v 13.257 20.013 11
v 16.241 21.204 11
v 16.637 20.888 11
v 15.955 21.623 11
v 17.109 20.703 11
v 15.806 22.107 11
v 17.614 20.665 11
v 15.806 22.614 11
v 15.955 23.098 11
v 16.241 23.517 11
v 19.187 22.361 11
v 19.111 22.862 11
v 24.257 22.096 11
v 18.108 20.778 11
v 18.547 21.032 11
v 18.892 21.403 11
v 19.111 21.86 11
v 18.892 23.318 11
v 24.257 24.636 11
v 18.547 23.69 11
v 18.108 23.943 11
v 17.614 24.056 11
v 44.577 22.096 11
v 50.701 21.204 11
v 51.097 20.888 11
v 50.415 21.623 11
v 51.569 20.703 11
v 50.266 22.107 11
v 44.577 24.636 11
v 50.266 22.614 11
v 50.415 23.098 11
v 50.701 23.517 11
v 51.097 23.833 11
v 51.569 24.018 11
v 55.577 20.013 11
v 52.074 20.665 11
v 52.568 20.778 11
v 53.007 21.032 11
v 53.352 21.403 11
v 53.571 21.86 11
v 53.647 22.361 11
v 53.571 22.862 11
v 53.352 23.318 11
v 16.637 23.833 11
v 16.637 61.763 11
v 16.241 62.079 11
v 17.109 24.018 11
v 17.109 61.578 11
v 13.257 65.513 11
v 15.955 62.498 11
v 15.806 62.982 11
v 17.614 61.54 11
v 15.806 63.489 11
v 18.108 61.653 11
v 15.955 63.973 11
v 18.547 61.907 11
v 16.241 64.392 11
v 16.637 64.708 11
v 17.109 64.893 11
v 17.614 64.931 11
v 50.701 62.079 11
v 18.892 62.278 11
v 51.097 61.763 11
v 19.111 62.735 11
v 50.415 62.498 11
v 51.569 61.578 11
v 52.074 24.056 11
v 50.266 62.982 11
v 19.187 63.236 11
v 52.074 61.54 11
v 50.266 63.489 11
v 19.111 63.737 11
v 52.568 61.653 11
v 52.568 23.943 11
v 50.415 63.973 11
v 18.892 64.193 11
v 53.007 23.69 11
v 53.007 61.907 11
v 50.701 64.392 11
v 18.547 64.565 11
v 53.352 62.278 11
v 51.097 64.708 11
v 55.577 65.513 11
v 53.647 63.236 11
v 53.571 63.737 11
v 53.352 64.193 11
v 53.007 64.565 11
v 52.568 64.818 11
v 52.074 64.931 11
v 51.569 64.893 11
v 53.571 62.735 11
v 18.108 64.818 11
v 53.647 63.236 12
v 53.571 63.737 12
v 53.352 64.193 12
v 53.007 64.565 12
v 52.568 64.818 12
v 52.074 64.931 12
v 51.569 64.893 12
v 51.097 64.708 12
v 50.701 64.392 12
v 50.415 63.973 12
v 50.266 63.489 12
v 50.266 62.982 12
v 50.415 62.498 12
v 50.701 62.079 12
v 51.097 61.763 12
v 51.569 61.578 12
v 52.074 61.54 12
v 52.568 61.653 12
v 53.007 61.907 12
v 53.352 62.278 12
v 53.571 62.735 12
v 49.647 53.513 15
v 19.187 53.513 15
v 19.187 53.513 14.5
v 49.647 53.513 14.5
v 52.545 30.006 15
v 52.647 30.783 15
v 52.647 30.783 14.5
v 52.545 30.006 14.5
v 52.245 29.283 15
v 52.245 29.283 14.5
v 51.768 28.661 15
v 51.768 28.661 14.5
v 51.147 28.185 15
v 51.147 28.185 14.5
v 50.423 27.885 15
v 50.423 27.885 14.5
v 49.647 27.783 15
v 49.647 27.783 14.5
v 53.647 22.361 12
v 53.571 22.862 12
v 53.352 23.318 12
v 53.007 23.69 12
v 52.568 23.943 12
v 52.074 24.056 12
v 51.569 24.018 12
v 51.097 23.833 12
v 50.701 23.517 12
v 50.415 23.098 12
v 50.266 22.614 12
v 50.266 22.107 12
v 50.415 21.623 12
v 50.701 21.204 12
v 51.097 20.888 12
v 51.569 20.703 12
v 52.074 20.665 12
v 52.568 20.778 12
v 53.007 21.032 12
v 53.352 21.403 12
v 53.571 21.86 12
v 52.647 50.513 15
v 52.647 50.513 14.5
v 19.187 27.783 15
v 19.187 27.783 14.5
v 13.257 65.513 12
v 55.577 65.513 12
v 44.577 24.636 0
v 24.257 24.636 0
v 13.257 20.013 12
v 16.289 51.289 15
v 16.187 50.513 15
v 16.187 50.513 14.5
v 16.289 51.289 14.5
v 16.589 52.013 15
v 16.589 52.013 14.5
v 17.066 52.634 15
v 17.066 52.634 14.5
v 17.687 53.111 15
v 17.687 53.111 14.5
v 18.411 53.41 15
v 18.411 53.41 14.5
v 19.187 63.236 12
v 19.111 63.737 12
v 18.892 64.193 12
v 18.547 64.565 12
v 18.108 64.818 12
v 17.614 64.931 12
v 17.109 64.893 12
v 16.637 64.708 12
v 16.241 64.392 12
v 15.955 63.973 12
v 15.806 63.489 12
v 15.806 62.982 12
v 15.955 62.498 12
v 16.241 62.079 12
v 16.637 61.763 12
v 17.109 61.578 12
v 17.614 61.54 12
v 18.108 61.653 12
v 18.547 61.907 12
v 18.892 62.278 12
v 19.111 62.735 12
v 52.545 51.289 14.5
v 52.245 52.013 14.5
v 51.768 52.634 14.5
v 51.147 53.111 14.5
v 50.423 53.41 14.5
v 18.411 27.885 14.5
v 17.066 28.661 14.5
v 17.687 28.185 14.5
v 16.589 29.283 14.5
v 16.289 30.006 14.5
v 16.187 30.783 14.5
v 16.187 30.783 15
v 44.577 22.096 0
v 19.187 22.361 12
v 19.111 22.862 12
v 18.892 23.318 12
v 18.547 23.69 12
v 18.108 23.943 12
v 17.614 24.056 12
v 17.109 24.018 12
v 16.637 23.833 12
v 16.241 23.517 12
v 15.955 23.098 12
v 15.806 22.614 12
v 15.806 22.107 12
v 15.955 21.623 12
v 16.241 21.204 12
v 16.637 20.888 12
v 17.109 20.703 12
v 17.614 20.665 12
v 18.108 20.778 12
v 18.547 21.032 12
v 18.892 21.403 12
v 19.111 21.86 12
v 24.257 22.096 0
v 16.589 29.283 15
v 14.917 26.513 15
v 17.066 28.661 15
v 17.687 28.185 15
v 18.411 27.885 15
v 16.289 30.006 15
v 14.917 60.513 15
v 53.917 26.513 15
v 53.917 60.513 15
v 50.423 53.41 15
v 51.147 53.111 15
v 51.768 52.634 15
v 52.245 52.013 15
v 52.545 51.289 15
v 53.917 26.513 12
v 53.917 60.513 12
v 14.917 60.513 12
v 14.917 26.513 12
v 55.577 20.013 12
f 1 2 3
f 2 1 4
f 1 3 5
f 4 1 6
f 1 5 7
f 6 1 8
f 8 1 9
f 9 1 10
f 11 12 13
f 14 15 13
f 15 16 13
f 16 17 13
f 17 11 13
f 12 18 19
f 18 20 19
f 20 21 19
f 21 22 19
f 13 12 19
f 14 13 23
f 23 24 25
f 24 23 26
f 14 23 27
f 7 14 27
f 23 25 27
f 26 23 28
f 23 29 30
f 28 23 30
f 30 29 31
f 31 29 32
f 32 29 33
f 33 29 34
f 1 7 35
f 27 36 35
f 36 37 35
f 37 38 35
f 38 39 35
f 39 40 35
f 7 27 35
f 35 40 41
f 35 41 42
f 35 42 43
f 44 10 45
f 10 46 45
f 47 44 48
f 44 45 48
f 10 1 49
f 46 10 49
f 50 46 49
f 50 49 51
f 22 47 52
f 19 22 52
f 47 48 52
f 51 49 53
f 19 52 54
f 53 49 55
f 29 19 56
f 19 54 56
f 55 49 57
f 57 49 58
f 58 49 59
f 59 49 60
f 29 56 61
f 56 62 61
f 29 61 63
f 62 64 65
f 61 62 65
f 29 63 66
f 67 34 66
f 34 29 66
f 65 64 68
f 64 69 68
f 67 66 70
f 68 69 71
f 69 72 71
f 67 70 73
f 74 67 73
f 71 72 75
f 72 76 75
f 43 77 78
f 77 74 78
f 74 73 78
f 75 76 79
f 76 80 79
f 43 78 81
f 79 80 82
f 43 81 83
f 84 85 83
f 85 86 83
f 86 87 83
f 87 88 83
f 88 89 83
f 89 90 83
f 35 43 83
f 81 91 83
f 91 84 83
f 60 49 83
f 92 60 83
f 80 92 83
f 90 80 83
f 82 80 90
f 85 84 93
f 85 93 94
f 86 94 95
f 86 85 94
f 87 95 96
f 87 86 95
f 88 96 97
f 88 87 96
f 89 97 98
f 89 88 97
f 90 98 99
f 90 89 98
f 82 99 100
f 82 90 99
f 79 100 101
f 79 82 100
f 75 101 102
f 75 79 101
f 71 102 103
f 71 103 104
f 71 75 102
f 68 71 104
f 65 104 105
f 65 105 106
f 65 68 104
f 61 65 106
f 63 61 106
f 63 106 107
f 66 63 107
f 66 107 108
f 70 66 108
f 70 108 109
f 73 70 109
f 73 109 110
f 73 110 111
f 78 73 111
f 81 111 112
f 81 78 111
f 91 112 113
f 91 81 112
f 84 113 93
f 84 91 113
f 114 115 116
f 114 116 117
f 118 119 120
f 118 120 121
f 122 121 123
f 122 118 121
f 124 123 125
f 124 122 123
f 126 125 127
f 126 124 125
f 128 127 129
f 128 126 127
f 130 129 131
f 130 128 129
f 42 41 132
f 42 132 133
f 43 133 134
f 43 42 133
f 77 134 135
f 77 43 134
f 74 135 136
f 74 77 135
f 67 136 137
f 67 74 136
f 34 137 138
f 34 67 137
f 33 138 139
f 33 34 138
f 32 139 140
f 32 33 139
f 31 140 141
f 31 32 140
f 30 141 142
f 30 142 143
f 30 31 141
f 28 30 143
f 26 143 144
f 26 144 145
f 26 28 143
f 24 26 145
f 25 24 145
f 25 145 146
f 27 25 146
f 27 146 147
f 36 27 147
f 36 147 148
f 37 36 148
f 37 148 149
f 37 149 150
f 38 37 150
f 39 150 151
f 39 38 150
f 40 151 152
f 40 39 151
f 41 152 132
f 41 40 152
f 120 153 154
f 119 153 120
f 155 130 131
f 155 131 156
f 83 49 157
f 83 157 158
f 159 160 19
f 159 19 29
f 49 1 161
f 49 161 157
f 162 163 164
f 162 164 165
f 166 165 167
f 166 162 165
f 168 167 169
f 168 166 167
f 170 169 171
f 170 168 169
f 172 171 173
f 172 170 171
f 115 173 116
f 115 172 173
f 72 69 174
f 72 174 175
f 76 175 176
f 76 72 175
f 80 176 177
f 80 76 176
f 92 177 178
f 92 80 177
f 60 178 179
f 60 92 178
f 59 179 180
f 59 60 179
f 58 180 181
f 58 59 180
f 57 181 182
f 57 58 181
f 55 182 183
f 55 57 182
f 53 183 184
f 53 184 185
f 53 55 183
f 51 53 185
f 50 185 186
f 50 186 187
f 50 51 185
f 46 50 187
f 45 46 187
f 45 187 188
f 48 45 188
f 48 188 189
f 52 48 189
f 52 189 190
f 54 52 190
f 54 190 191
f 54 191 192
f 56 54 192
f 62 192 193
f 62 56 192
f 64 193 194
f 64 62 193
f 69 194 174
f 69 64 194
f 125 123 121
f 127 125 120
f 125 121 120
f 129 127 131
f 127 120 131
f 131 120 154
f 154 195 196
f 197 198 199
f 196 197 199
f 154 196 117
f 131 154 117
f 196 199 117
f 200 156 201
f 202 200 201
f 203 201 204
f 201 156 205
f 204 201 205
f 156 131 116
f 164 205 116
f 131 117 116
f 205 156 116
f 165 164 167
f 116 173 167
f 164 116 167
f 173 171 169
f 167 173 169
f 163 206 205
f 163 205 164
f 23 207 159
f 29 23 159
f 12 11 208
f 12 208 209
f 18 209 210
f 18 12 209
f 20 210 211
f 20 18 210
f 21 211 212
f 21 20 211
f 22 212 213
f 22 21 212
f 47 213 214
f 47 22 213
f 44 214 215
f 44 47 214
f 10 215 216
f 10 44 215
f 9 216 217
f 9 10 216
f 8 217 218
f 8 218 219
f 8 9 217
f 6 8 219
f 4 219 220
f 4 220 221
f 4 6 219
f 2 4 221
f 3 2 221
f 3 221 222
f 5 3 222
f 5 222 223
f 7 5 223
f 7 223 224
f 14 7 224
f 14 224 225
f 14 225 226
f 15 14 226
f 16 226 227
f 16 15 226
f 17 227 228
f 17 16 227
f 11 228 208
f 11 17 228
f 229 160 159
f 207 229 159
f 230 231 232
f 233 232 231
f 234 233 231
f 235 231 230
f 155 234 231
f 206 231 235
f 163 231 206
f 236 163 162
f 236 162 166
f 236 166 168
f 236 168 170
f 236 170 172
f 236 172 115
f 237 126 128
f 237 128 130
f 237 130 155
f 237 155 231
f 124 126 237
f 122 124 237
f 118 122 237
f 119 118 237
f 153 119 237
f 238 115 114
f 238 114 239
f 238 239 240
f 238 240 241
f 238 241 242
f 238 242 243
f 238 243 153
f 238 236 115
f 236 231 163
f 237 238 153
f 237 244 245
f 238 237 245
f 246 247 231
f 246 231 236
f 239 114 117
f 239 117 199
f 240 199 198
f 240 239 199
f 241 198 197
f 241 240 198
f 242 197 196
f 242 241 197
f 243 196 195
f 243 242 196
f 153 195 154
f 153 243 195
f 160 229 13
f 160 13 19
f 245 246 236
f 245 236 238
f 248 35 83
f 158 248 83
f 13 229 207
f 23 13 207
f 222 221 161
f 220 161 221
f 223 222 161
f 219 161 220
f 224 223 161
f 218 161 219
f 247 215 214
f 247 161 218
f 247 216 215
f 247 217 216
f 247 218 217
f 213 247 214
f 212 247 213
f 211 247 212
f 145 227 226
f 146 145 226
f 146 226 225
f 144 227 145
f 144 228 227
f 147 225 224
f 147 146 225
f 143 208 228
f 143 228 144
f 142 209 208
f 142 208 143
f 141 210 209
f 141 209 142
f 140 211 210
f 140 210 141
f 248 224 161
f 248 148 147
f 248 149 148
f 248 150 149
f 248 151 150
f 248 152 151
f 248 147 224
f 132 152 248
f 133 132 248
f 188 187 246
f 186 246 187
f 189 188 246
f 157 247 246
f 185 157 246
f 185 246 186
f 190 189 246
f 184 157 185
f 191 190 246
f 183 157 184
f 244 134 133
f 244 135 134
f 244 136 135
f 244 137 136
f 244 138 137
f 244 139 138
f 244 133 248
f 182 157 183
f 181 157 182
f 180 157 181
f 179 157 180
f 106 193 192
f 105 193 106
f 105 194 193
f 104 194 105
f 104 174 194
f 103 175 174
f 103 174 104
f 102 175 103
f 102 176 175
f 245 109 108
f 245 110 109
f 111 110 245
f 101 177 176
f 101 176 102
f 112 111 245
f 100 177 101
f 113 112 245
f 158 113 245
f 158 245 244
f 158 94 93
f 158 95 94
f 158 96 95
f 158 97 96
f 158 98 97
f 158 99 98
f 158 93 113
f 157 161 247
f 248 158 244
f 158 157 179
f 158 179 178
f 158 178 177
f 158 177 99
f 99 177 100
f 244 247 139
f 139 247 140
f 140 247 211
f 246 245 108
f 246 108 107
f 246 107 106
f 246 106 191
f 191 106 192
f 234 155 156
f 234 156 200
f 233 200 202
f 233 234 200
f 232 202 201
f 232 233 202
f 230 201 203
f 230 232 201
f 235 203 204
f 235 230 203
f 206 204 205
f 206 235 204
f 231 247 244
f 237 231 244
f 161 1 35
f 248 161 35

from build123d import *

# Parameters (mm, degrees)
SKETCH_1_W          = 20.32
SKETCH_1_H          = 2.54
EXTRUDE_1_DEPTH     = 11
SKETCH_2_W          = 42.32
SKETCH_2_H          = 45.5
SKETCH_2_R          = 1.7
EXTRUDE_2_DEPTH     = 1
SKETCH_3_W          = 39
SKETCH_3_H          = 34
EXTRUDE_3_DEPTH     = 3
CUT_EXTRUDE_1_DEPTH = 0.5


with BuildPart() as part:
    # 草图1 → 凸台-拉伸1 (new body)
    with BuildSketch(Plane.XY):
        with Locations((34.416985014, 23.365786132)):
            Rectangle(SKETCH_1_W, SKETCH_1_H)
    extrude(amount=EXTRUDE_1_DEPTH)

    # 草图2 → 凸台-拉伸2 (add)
    with BuildSketch(Plane.XY.offset(11)):
        with Locations((34.416985014, 42.762700025)):
            Rectangle(SKETCH_2_W, SKETCH_2_H)
        with Locations((17.486918974, 22.360680721)):
            Circle(SKETCH_2_R, mode=Mode.SUBTRACT)
        with Locations((51.946913894, 22.360680721)):
            Circle(SKETCH_2_R, mode=Mode.SUBTRACT)
        with Locations((17.486918974, 63.235712471)):
            Circle(SKETCH_2_R, mode=Mode.SUBTRACT)
        with Locations((51.946913894, 63.235712471)):
            Circle(SKETCH_2_R, mode=Mode.SUBTRACT)
    extrude(amount=EXTRUDE_2_DEPTH)

    # 草图3 → 凸台-拉伸3 (add)
    with BuildSketch(Plane.XY.offset(12)):
        with Locations((34.416985014, 43.512700025)):
            Rectangle(SKETCH_3_W, SKETCH_3_H)
    extrude(amount=EXTRUDE_3_DEPTH)

    # 草图4 → 切除-拉伸1 (cut)
    with BuildSketch(Plane.XY.offset(15)):
        with BuildLine():
            Line((49.646985014, 27.782700025), (19.186985014, 27.782700025))
            ThreePointArc((19.186985014, 27.782700025), (17.06566467, 28.661379682), (16.186985014, 30.782700025))
            Line((16.186985014, 30.782700025), (16.186985014, 50.512700025))
            ThreePointArc((16.186985014, 50.512700025), (17.06566467, 52.634020369), (19.186985014, 53.512700025))
            Line((19.186985014, 53.512700025), (49.646985014, 53.512700025))
            ThreePointArc((49.646985014, 53.512700025), (51.768305358, 52.634020369), (52.646985014, 50.512700025))
            Line((52.646985014, 50.512700025), (52.646985014, 30.782700025))
            ThreePointArc((52.646985014, 30.782700025), (51.768305358, 28.661379682), (49.646985014, 27.782700025))
        make_face()
    extrude(amount=-CUT_EXTRUDE_1_DEPTH, mode=Mode.SUBTRACT)


solid = part.part
